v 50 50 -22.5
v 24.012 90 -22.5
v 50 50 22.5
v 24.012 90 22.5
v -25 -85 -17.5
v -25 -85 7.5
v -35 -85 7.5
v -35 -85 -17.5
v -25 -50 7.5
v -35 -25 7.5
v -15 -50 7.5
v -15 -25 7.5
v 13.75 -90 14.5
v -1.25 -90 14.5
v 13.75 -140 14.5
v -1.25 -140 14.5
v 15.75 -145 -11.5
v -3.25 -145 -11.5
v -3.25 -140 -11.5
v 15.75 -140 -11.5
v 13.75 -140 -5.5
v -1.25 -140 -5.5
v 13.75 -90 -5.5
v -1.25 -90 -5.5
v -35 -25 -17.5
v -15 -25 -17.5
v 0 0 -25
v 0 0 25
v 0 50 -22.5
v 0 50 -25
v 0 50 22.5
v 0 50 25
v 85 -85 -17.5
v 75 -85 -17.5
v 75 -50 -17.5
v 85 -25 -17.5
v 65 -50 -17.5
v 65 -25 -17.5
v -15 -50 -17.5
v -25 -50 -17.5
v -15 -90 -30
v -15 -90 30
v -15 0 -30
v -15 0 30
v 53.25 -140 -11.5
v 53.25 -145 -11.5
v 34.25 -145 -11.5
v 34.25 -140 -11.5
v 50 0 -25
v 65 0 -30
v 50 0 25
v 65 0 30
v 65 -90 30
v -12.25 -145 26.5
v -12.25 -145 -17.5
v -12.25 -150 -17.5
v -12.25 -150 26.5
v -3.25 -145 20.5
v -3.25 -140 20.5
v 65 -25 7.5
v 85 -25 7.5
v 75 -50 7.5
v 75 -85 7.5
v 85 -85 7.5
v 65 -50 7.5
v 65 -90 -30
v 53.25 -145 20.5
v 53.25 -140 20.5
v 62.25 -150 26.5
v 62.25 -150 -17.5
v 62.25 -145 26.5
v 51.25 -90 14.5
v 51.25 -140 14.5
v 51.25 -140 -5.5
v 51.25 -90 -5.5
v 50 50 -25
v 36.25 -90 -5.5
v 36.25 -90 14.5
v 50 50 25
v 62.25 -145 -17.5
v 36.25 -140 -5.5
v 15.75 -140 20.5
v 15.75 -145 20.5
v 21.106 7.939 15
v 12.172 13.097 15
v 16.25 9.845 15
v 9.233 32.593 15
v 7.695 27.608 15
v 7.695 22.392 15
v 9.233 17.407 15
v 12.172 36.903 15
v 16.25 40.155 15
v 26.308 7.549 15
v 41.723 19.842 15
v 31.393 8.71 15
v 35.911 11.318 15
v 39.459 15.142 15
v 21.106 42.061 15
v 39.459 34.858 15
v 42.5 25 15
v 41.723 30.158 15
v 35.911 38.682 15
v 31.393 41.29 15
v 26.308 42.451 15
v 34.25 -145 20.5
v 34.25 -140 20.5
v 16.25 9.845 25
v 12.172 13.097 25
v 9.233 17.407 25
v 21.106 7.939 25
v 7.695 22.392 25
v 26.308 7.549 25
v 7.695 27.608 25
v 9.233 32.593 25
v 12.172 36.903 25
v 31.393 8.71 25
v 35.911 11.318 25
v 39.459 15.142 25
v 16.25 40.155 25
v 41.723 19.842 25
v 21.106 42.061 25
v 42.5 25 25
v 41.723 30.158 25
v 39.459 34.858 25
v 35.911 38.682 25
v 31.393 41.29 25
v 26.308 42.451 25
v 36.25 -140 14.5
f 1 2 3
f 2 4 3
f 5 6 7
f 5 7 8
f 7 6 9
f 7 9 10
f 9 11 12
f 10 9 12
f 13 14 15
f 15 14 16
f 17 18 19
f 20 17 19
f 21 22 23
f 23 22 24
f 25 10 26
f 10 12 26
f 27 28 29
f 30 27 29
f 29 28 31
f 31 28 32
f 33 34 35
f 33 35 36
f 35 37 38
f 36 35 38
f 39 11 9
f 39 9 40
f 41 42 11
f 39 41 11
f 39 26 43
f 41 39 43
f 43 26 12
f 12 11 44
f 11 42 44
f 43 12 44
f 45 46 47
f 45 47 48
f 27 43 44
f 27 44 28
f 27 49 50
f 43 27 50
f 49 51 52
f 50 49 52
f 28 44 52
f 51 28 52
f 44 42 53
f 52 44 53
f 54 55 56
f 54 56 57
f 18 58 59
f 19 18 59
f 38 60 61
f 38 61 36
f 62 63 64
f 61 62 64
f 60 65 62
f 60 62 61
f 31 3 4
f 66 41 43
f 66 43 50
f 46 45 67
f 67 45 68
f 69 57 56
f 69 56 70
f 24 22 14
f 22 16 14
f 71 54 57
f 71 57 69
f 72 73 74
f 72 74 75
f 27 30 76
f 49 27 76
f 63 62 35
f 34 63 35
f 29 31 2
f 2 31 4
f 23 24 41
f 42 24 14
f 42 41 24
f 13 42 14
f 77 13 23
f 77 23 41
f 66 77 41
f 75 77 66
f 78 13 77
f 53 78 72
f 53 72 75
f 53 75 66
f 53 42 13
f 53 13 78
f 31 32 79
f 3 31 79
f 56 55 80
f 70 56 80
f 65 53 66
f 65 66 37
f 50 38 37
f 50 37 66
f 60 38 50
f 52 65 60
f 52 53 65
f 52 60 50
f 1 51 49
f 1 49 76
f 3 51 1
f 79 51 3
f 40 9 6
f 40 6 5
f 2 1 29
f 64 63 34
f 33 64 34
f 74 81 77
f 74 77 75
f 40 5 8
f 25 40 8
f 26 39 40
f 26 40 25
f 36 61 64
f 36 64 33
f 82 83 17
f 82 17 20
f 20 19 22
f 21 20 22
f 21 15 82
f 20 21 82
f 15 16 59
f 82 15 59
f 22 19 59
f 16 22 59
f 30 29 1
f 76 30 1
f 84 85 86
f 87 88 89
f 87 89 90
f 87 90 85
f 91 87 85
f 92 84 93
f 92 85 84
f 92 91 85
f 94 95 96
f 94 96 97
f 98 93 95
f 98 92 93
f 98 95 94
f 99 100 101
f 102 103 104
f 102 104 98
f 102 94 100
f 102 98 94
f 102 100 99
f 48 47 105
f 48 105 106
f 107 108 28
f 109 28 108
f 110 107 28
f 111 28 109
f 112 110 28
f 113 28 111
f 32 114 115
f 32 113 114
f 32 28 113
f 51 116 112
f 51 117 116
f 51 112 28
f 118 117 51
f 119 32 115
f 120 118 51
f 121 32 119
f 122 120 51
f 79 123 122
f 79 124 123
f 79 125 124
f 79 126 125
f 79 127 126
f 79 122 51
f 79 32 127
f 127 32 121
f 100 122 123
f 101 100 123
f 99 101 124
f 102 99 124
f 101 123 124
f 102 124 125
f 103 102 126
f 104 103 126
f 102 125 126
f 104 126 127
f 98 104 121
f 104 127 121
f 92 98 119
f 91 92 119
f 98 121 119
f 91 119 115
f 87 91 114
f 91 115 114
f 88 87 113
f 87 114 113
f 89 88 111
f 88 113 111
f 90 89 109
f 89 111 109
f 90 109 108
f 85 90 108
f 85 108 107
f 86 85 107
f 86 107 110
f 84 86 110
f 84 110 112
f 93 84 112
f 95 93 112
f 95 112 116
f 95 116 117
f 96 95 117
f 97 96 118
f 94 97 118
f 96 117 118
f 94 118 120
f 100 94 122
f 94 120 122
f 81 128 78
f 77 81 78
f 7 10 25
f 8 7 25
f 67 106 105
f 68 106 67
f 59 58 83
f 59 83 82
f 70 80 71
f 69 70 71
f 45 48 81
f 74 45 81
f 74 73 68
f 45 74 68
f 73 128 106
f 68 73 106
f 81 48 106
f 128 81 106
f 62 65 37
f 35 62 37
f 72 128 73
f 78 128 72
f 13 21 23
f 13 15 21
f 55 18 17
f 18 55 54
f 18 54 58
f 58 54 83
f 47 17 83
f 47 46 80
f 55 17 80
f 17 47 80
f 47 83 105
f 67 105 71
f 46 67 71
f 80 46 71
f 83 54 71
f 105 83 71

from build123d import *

# Parameters (mm, degrees)
SKETCH1_W             = 50
SKETCH1_H             = 50
BOSS_EXTRUDE1_DEPTH   = 25
BOSS_EXTRUDE2_DEPTH   = 22.5
SKETCH4_W             = 80
SKETCH4_H             = 90
BOSS_EXTRUDE4_DEPTH   = 30
SKETCH5_W             = 25
SKETCH5_H             = 25
BOSS_EXTRUDE5_DEPTH   = 10
SKETCH6_W             = 25
SKETCH6_H             = 60
BOSS_EXTRUDE6_DEPTH   = 10
SKETCH7_W             = 15
SKETCH7_H             = 10
BOSS_EXTRUDE7_DEPTH   = 50
SKETCH8_W             = 19
SKETCH8_H             = 30
BOSS_EXTRUDE10_DEPTH  = 5
MIRROR3_START         = -1.25
MIRROR3_DEPTH         = 15
MIRROR3_START_2       = 36.25
MIRROR3_2_OUTLINE_W   = 5
MIRROR3_2_OUTLINE_H   = 2
MIRROR3_2_OUTLINE_W_2 = 50
MIRROR3_2_OUTLINE_H_2 = 10
MIRROR3_2_DEPTH       = 15
MIRROR3_START_3       = -3.25
MIRROR3_3_OUTLINE_W   = 5
MIRROR3_3_OUTLINE_H   = 32
MIRROR3_3_DEPTH       = 19
MIRROR3_START_4       = 34.25
MIRROR3_4_OUTLINE_W   = 5
MIRROR3_4_OUTLINE_H   = 2
MIRROR3_4_DEPTH       = 19
SKETCH9_W             = 74.5
SKETCH9_H             = 44
BOSS_EXTRUDE11_DEPTH  = 5
SKETCH10_R            = 17.5
CUT_EXTRUDE1_DEPTH    = 10


# Read off the part's stored shape, not the designer's step: Mirror3
with BuildPart() as part:
    # Sketch1 → Boss-Extrude1 (new, symmetric)
    with BuildSketch(Plane.XY):
        with Locations((25, 25)):
            Rectangle(SKETCH1_W, SKETCH1_H)
    extrude(amount=BOSS_EXTRUDE1_DEPTH, both=True)

    # Sketch2 → Boss-Extrude2 (add, symmetric)
    with BuildSketch(Plane.XY):
        Polygon((0, 50), (24.011645754, 90), (50, 50), align=None)
    extrude(amount=BOSS_EXTRUDE2_DEPTH, both=True)

    # Sketch4 → Boss-Extrude4 (add, symmetric)
    with BuildSketch(Plane.XY):
        with Locations((25, -45)):
            Rectangle(SKETCH4_W, SKETCH4_H)
    extrude(amount=BOSS_EXTRUDE4_DEPTH, both=True)

    # Sketch5 → Boss-Extrude5 (add)
    with BuildSketch(Plane(origin=(65, 0, 0), x_dir=(0, 0, -1), z_dir=(1, 0, 0))):
        with Locations((5, -37.5)):
            Rectangle(SKETCH5_W, SKETCH5_H)
    boss_extrude5 = extrude(amount=BOSS_EXTRUDE5_DEPTH)

    # Sketch6 → Boss-Extrude6 (add)
    with BuildSketch(Plane(origin=(75, 0, 0), x_dir=(0, 0, -1), z_dir=(1, 0, 0))):
        with Locations((5, -55)):
            Rectangle(SKETCH6_W, SKETCH6_H)
    boss_extrude6 = extrude(amount=BOSS_EXTRUDE6_DEPTH)

    # Mirror1: Boss-Extrude5, Boss-Extrude6 across plane
    add(boss_extrude5.mirror(Plane(origin=(25, 0, 0), x_dir=(0, 0, 1), z_dir=(1, 0, 0))))
    add(boss_extrude6.mirror(Plane(origin=(25, 0, 0), x_dir=(0, 0, 1), z_dir=(1, 0, 0))))

    # Sketch7 → Boss-Extrude7 (add)
    with BuildSketch(Plane.XZ.offset(90)):
        with Locations((43.75, -0.5)):
            Rectangle(SKETCH7_W, SKETCH7_H)
    extrude(amount=BOSS_EXTRUDE7_DEPTH)

    # Sketch8 → Boss-Extrude10 (add)
    with BuildSketch(Plane.XZ.offset(140)):
        with Locations((43.75, 5.5)):
            Rectangle(SKETCH8_W, SKETCH8_H)
    extrude(amount=BOSS_EXTRUDE10_DEPTH)

    # Mirror3 outline → Mirror3 (add)
    with BuildSketch(Plane.YZ.offset(MIRROR3_START)):
        Polygon((-90, -5.5), (-90, 14.5), (-140, 14.5), (-140, 20.5), (-145, 20.5), (-145, -11.5), (-140, -11.5), (-140, -5.5), align=None)
    extrude(amount=MIRROR3_DEPTH)

    # Mirror3 2 outline → Mirror3 2 (add)
    with BuildSketch(Plane.YZ.offset(MIRROR3_START_2)):
        with Locations((-142.5, -10.5)):
            Rectangle(MIRROR3_2_OUTLINE_W, MIRROR3_2_OUTLINE_H)
        with Locations((-115, 9.5)):
            Rectangle(MIRROR3_2_OUTLINE_W_2, MIRROR3_2_OUTLINE_H_2)
    extrude(amount=MIRROR3_2_DEPTH)

    # Mirror3 3 outline → Mirror3 3 (add)
    with BuildSketch(Plane.YZ.offset(MIRROR3_START_3)):
        with Locations((-142.5, 4.5)):
            Rectangle(MIRROR3_3_OUTLINE_W, MIRROR3_3_OUTLINE_H)
    extrude(amount=MIRROR3_3_DEPTH)

    # Mirror3 4 outline → Mirror3 4 (add)
    with BuildSketch(Plane.YZ.offset(MIRROR3_START_4)):
        with Locations((-142.5, -10.5)):
            Rectangle(MIRROR3_4_OUTLINE_W, MIRROR3_4_OUTLINE_H)
    extrude(amount=MIRROR3_4_DEPTH)

    # Sketch9 → Boss-Extrude11 (add)
    with BuildSketch(Plane.XZ.offset(145)):
        with Locations((25, 4.5)):
            Rectangle(SKETCH9_W, SKETCH9_H)
    extrude(amount=BOSS_EXTRUDE11_DEPTH)

    # Sketch10 → Cut-Extrude1 (cut)
    with BuildSketch(Plane.XY.offset(25)):
        with Locations((25, 25)):
            Circle(SKETCH10_R)
    extrude(amount=-CUT_EXTRUDE1_DEPTH, mode=Mode.SUBTRACT)


solid = part.part
